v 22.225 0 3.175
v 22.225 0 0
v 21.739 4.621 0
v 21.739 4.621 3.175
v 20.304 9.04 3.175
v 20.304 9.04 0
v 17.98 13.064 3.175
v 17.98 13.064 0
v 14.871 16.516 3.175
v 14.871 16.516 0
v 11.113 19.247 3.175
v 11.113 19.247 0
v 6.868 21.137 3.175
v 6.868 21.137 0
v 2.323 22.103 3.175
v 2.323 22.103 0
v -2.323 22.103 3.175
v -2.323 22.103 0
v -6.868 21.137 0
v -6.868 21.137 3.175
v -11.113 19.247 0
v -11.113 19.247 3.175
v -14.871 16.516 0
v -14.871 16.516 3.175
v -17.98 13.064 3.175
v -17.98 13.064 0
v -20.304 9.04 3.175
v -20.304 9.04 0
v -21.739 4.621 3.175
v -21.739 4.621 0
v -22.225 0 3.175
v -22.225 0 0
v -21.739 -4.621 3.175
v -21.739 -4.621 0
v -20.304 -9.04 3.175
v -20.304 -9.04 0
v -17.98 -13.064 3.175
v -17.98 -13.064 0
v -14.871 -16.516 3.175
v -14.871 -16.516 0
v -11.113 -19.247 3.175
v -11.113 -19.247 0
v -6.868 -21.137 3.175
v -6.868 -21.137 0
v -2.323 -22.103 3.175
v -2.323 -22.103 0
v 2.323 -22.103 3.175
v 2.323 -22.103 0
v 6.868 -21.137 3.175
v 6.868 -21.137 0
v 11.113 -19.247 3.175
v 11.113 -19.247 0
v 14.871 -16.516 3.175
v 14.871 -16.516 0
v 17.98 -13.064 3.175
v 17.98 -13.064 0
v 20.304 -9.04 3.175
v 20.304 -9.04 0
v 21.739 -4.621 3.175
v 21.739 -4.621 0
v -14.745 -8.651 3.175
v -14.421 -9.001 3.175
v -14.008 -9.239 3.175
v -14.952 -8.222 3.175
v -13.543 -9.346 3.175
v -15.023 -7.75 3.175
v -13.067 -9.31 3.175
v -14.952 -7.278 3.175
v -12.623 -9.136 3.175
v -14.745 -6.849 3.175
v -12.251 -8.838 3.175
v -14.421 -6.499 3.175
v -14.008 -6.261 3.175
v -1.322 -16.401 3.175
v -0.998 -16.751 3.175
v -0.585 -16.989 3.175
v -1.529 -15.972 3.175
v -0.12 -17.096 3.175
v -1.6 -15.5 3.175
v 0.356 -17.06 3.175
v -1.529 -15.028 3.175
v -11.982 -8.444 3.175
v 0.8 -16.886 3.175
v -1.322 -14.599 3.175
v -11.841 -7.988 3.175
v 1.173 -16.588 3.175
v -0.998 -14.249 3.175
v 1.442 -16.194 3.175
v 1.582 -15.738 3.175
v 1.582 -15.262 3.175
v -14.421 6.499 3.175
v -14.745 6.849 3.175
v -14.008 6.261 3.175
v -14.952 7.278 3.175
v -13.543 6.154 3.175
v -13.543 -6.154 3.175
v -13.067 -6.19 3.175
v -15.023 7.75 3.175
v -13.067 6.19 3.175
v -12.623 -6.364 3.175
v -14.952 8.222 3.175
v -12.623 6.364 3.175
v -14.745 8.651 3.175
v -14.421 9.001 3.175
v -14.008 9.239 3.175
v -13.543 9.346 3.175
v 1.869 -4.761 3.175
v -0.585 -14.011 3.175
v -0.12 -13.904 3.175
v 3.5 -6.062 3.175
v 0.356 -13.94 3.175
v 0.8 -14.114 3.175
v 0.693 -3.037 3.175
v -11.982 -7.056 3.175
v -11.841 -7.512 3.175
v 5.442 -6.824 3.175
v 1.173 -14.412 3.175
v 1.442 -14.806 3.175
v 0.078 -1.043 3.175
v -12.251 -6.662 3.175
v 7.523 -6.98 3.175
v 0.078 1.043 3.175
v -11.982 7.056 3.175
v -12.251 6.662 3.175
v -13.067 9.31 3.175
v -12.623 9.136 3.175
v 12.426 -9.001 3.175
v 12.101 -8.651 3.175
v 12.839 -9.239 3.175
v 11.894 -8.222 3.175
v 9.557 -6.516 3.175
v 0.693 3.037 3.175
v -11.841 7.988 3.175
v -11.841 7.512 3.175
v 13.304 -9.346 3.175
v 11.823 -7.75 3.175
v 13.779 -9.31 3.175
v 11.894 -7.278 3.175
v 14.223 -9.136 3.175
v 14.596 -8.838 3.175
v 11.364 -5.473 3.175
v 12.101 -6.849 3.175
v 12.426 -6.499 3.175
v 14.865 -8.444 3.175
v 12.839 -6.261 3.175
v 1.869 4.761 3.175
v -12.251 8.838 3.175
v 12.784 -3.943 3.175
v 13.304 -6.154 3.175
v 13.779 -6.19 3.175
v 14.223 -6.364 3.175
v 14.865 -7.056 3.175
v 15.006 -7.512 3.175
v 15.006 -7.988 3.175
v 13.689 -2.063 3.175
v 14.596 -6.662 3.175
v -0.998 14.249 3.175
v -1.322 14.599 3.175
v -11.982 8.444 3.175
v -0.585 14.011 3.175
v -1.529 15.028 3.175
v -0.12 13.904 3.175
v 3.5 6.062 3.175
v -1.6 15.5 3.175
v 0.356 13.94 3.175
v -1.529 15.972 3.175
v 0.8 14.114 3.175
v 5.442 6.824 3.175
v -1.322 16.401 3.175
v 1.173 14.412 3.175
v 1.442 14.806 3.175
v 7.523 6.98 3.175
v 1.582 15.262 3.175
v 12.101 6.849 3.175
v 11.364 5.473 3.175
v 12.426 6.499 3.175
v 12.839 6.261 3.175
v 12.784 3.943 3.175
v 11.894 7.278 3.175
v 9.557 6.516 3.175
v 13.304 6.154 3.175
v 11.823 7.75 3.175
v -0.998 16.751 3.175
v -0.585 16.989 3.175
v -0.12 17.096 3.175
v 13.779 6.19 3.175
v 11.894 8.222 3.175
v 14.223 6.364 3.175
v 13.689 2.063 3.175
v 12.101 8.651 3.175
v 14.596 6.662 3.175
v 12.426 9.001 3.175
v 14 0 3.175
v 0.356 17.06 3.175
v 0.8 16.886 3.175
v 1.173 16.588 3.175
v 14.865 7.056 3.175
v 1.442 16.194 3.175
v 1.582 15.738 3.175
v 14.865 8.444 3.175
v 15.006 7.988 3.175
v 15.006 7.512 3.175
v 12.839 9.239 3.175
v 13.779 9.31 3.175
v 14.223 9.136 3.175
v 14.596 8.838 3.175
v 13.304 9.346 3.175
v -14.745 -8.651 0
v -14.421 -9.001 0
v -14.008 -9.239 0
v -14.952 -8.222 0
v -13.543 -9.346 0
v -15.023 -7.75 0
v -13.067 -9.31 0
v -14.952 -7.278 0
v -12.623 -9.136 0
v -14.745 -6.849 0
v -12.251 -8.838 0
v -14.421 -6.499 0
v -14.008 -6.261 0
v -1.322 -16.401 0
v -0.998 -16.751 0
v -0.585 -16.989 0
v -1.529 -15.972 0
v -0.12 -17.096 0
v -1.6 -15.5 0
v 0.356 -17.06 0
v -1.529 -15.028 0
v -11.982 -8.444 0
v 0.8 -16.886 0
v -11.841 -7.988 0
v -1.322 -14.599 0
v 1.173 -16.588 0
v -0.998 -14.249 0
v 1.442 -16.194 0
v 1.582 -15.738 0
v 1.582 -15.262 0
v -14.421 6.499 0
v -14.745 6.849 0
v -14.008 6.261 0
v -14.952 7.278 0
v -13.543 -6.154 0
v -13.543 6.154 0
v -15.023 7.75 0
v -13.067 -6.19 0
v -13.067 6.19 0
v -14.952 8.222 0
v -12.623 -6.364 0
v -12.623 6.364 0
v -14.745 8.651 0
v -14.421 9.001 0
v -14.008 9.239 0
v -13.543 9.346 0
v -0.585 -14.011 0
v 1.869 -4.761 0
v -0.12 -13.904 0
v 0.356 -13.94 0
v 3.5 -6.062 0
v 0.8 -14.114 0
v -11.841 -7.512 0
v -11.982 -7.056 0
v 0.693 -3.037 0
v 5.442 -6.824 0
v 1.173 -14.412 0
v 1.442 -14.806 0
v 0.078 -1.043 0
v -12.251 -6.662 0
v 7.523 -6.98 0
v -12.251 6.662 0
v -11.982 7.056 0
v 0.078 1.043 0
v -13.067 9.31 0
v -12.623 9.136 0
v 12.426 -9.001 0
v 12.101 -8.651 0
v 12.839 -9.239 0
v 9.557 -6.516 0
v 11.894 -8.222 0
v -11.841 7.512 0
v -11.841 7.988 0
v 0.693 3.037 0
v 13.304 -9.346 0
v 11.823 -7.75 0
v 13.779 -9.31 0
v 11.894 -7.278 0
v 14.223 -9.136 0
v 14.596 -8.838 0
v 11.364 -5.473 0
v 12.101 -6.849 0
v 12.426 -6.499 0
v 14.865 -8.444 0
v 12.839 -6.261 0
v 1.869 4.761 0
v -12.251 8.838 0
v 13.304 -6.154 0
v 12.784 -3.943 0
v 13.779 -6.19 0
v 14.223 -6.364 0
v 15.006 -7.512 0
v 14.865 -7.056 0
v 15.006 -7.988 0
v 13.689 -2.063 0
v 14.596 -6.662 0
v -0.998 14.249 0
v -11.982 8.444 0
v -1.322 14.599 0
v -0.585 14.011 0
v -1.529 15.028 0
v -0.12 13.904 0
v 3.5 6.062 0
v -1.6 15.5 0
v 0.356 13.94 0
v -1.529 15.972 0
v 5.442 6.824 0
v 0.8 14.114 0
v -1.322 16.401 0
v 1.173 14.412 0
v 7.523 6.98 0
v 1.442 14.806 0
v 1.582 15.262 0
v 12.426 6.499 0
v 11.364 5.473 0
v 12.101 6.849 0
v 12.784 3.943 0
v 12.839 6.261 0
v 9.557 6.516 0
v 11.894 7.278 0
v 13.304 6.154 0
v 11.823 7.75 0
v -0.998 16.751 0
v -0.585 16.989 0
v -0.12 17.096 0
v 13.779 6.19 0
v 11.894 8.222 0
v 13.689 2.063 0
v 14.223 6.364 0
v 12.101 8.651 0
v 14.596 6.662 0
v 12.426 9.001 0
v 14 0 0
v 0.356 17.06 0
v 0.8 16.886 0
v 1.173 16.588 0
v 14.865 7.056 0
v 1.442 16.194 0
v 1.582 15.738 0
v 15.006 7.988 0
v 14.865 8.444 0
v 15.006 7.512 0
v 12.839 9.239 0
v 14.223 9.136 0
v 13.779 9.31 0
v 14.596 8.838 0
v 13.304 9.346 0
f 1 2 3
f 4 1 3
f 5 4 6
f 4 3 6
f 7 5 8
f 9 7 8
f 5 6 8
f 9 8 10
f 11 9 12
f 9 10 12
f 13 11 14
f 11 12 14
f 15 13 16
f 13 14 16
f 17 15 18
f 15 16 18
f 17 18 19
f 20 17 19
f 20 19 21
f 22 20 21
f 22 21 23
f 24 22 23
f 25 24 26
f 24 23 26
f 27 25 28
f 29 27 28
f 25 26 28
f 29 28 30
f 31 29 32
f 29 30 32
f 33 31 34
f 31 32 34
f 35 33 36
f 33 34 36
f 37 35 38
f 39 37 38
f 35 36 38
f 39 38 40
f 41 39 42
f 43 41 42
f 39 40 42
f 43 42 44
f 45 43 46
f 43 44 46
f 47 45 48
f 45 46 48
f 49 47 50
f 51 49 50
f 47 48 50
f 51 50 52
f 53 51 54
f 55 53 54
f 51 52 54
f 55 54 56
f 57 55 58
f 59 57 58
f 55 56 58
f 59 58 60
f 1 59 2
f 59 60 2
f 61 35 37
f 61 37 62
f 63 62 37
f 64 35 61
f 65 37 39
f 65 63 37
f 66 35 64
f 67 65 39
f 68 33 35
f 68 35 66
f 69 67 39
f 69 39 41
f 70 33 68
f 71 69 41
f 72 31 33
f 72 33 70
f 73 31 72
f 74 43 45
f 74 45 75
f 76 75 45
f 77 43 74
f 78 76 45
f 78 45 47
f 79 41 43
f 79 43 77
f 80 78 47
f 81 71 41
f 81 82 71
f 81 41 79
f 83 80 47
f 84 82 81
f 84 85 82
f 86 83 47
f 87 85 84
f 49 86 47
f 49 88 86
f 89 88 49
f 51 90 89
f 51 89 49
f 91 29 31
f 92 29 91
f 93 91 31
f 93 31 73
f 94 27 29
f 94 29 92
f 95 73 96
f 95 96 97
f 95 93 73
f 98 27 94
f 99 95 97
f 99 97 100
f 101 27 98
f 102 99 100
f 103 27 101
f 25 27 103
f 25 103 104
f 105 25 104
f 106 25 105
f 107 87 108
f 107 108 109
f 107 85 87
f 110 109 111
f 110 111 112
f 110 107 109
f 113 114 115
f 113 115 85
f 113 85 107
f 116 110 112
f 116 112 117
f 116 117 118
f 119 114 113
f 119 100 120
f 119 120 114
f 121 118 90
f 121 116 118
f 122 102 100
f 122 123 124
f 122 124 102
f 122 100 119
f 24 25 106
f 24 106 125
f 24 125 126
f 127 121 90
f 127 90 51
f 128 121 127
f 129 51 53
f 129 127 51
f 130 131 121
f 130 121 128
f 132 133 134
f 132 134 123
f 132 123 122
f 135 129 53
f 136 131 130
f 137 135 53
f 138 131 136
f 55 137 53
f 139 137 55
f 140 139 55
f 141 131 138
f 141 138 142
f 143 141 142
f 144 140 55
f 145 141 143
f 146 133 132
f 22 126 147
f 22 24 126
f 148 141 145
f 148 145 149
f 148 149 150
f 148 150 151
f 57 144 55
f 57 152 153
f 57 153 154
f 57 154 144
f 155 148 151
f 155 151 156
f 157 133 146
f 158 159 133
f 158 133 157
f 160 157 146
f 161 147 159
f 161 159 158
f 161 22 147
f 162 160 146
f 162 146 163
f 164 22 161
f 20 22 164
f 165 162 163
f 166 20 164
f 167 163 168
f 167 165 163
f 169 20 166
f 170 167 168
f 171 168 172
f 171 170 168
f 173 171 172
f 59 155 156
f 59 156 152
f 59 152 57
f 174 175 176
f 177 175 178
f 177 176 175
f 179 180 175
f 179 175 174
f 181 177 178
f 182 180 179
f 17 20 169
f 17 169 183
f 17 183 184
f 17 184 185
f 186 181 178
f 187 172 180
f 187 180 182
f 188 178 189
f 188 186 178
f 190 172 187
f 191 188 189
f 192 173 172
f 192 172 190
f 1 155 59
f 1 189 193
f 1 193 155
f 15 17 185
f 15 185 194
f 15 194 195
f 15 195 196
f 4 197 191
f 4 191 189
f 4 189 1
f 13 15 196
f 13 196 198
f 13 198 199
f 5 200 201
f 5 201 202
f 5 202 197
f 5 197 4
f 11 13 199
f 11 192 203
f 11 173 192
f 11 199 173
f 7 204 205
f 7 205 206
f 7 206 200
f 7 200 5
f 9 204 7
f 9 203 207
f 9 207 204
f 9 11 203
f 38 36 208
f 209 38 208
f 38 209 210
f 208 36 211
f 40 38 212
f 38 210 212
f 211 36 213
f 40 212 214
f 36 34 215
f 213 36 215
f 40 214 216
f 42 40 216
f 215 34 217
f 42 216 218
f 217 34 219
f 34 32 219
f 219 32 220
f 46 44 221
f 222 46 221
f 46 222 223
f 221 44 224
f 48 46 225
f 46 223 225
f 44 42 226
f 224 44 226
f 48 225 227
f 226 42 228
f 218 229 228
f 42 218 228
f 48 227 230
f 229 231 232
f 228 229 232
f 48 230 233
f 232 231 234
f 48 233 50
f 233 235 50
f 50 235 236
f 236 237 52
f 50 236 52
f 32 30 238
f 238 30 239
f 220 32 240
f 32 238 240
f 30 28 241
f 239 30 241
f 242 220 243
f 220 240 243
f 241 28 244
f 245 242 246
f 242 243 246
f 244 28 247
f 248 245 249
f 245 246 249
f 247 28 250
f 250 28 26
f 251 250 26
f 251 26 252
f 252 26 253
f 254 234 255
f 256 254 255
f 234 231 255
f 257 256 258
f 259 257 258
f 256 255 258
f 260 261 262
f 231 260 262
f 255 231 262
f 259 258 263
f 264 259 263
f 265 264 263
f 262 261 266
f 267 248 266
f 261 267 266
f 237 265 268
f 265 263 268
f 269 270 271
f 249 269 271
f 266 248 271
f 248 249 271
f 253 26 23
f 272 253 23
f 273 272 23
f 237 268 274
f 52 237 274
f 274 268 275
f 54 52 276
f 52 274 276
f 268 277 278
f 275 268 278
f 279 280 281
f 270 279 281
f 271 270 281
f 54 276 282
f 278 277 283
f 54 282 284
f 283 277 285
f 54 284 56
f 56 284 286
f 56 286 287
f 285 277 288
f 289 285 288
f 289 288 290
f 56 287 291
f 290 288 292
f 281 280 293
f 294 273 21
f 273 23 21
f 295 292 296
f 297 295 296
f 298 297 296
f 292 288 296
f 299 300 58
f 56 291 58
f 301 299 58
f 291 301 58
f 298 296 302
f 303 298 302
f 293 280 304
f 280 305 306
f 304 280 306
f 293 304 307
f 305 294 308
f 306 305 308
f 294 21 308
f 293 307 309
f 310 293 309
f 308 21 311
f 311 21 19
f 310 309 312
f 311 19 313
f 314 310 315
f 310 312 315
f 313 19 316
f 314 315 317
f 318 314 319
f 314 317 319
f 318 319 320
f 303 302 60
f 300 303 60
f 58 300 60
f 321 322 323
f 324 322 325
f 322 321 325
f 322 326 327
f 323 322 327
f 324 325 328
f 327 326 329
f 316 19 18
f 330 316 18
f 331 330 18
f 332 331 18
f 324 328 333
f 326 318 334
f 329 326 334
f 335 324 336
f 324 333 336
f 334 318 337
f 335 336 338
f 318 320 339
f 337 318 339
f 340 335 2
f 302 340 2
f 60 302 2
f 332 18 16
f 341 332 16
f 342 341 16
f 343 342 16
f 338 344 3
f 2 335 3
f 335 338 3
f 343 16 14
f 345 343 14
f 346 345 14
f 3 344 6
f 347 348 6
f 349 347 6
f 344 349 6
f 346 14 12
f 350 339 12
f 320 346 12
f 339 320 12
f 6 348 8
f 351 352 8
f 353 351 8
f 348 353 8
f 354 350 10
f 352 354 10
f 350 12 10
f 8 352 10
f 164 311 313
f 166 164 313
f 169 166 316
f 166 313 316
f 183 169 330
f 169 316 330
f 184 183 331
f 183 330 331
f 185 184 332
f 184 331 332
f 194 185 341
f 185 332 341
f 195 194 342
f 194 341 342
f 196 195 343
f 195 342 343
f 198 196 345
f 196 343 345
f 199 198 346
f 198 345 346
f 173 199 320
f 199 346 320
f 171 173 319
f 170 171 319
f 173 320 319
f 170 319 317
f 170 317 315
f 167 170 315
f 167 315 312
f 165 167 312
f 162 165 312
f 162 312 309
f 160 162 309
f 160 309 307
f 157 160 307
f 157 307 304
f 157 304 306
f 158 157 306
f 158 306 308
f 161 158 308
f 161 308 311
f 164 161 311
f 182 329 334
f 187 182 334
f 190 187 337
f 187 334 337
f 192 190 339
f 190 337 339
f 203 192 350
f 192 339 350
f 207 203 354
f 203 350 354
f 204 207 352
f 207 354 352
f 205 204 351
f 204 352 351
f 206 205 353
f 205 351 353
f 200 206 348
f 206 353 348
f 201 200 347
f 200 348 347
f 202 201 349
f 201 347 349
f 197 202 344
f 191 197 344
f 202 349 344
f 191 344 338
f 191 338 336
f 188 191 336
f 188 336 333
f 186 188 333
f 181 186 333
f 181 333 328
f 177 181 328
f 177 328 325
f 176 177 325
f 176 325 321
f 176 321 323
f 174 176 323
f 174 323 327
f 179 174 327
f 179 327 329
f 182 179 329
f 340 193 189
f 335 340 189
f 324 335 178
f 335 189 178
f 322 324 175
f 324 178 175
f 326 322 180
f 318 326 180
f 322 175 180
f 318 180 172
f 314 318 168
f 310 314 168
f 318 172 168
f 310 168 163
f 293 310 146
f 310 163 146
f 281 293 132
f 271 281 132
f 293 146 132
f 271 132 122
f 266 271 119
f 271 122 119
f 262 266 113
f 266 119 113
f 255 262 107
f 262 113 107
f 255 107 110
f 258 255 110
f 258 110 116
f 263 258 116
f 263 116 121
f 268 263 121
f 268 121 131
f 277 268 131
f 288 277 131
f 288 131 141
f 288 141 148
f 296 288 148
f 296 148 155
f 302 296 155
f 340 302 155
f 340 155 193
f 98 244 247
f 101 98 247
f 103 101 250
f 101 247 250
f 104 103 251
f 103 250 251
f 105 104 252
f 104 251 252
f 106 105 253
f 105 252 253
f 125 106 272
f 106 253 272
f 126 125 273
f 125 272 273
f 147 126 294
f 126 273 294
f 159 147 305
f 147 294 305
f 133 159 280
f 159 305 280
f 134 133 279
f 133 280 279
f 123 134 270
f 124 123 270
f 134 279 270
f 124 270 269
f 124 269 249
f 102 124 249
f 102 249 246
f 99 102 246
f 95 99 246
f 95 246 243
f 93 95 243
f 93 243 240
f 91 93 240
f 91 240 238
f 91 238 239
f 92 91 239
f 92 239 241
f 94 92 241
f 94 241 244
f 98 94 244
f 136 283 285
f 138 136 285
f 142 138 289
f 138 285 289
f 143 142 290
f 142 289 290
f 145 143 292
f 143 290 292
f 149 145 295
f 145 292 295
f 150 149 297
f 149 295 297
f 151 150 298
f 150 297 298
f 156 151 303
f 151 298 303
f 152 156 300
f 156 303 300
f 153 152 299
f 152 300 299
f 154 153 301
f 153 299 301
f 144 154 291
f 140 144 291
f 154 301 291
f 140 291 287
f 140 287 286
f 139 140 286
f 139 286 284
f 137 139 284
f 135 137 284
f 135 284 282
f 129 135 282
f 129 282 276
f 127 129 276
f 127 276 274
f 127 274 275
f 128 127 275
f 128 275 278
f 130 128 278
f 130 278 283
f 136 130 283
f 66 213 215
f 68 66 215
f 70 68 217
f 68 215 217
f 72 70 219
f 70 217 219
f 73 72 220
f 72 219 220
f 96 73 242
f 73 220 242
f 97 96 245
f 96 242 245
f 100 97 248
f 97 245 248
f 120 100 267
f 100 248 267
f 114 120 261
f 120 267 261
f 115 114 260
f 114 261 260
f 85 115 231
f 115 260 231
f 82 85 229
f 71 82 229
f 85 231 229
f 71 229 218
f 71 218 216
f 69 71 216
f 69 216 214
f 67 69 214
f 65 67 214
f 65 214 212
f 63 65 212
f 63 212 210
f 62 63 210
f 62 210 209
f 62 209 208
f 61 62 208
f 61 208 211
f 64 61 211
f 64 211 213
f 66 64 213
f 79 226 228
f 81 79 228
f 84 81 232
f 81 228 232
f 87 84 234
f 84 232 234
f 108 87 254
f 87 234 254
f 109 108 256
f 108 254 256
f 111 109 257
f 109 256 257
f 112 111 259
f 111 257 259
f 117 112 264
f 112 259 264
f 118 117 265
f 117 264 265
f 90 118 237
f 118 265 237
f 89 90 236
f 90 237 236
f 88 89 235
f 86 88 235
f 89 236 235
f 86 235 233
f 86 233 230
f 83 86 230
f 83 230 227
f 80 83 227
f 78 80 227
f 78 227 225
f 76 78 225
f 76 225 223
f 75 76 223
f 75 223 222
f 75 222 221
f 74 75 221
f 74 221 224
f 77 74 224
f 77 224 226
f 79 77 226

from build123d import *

# Parameters (mm, degrees)
SKETCH1_R                = 22.225
BOSS_EXTRUDE1_DEPTH      = 3.175
M3_CLEARANCE_HOLE1_D     = 3.2
M3_CLEARANCE_HOLE1_DEPTH = 3.175
CUT_EXTRUDE1_REACH       = 5.175
SKETCH4_R                = 7


with BuildPart() as part:
    # Sketch1 → Boss-Extrude1 (new body)
    with BuildSketch(Plane.XY):
        Circle(SKETCH1_R)
    extrude(amount=BOSS_EXTRUDE1_DEPTH)

    # M3 Clearance Hole1
    with Locations(Plane.XY.offset(3.175)):
        with Locations((-13.423393759, 7.75), (0, 15.5), (13.423393759, 7.75), (13.423393759, -7.75), (0, -15.5), (-13.423393759, -7.75)):
            Hole(M3_CLEARANCE_HOLE1_D / 2, depth=M3_CLEARANCE_HOLE1_DEPTH)

    # Sketch4 → Cut-Extrude1 (cut, up to next)
    with BuildSketch(Plane.XY.offset(3.175), mode=Mode.PRIVATE) as cut_extrude1_sk1:
        with Locations((7, 0)):
            Circle(SKETCH4_R)
    cut_extrude1_tool1 = extrude(cut_extrude1_sk1.sketch, amount=-CUT_EXTRUDE1_REACH, mode=Mode.PRIVATE) & part.part
    add(cut_extrude1_tool1.solids().sort_by_distance((7, 0, 3.175))[0], mode=Mode.SUBTRACT)


solid = part.part
